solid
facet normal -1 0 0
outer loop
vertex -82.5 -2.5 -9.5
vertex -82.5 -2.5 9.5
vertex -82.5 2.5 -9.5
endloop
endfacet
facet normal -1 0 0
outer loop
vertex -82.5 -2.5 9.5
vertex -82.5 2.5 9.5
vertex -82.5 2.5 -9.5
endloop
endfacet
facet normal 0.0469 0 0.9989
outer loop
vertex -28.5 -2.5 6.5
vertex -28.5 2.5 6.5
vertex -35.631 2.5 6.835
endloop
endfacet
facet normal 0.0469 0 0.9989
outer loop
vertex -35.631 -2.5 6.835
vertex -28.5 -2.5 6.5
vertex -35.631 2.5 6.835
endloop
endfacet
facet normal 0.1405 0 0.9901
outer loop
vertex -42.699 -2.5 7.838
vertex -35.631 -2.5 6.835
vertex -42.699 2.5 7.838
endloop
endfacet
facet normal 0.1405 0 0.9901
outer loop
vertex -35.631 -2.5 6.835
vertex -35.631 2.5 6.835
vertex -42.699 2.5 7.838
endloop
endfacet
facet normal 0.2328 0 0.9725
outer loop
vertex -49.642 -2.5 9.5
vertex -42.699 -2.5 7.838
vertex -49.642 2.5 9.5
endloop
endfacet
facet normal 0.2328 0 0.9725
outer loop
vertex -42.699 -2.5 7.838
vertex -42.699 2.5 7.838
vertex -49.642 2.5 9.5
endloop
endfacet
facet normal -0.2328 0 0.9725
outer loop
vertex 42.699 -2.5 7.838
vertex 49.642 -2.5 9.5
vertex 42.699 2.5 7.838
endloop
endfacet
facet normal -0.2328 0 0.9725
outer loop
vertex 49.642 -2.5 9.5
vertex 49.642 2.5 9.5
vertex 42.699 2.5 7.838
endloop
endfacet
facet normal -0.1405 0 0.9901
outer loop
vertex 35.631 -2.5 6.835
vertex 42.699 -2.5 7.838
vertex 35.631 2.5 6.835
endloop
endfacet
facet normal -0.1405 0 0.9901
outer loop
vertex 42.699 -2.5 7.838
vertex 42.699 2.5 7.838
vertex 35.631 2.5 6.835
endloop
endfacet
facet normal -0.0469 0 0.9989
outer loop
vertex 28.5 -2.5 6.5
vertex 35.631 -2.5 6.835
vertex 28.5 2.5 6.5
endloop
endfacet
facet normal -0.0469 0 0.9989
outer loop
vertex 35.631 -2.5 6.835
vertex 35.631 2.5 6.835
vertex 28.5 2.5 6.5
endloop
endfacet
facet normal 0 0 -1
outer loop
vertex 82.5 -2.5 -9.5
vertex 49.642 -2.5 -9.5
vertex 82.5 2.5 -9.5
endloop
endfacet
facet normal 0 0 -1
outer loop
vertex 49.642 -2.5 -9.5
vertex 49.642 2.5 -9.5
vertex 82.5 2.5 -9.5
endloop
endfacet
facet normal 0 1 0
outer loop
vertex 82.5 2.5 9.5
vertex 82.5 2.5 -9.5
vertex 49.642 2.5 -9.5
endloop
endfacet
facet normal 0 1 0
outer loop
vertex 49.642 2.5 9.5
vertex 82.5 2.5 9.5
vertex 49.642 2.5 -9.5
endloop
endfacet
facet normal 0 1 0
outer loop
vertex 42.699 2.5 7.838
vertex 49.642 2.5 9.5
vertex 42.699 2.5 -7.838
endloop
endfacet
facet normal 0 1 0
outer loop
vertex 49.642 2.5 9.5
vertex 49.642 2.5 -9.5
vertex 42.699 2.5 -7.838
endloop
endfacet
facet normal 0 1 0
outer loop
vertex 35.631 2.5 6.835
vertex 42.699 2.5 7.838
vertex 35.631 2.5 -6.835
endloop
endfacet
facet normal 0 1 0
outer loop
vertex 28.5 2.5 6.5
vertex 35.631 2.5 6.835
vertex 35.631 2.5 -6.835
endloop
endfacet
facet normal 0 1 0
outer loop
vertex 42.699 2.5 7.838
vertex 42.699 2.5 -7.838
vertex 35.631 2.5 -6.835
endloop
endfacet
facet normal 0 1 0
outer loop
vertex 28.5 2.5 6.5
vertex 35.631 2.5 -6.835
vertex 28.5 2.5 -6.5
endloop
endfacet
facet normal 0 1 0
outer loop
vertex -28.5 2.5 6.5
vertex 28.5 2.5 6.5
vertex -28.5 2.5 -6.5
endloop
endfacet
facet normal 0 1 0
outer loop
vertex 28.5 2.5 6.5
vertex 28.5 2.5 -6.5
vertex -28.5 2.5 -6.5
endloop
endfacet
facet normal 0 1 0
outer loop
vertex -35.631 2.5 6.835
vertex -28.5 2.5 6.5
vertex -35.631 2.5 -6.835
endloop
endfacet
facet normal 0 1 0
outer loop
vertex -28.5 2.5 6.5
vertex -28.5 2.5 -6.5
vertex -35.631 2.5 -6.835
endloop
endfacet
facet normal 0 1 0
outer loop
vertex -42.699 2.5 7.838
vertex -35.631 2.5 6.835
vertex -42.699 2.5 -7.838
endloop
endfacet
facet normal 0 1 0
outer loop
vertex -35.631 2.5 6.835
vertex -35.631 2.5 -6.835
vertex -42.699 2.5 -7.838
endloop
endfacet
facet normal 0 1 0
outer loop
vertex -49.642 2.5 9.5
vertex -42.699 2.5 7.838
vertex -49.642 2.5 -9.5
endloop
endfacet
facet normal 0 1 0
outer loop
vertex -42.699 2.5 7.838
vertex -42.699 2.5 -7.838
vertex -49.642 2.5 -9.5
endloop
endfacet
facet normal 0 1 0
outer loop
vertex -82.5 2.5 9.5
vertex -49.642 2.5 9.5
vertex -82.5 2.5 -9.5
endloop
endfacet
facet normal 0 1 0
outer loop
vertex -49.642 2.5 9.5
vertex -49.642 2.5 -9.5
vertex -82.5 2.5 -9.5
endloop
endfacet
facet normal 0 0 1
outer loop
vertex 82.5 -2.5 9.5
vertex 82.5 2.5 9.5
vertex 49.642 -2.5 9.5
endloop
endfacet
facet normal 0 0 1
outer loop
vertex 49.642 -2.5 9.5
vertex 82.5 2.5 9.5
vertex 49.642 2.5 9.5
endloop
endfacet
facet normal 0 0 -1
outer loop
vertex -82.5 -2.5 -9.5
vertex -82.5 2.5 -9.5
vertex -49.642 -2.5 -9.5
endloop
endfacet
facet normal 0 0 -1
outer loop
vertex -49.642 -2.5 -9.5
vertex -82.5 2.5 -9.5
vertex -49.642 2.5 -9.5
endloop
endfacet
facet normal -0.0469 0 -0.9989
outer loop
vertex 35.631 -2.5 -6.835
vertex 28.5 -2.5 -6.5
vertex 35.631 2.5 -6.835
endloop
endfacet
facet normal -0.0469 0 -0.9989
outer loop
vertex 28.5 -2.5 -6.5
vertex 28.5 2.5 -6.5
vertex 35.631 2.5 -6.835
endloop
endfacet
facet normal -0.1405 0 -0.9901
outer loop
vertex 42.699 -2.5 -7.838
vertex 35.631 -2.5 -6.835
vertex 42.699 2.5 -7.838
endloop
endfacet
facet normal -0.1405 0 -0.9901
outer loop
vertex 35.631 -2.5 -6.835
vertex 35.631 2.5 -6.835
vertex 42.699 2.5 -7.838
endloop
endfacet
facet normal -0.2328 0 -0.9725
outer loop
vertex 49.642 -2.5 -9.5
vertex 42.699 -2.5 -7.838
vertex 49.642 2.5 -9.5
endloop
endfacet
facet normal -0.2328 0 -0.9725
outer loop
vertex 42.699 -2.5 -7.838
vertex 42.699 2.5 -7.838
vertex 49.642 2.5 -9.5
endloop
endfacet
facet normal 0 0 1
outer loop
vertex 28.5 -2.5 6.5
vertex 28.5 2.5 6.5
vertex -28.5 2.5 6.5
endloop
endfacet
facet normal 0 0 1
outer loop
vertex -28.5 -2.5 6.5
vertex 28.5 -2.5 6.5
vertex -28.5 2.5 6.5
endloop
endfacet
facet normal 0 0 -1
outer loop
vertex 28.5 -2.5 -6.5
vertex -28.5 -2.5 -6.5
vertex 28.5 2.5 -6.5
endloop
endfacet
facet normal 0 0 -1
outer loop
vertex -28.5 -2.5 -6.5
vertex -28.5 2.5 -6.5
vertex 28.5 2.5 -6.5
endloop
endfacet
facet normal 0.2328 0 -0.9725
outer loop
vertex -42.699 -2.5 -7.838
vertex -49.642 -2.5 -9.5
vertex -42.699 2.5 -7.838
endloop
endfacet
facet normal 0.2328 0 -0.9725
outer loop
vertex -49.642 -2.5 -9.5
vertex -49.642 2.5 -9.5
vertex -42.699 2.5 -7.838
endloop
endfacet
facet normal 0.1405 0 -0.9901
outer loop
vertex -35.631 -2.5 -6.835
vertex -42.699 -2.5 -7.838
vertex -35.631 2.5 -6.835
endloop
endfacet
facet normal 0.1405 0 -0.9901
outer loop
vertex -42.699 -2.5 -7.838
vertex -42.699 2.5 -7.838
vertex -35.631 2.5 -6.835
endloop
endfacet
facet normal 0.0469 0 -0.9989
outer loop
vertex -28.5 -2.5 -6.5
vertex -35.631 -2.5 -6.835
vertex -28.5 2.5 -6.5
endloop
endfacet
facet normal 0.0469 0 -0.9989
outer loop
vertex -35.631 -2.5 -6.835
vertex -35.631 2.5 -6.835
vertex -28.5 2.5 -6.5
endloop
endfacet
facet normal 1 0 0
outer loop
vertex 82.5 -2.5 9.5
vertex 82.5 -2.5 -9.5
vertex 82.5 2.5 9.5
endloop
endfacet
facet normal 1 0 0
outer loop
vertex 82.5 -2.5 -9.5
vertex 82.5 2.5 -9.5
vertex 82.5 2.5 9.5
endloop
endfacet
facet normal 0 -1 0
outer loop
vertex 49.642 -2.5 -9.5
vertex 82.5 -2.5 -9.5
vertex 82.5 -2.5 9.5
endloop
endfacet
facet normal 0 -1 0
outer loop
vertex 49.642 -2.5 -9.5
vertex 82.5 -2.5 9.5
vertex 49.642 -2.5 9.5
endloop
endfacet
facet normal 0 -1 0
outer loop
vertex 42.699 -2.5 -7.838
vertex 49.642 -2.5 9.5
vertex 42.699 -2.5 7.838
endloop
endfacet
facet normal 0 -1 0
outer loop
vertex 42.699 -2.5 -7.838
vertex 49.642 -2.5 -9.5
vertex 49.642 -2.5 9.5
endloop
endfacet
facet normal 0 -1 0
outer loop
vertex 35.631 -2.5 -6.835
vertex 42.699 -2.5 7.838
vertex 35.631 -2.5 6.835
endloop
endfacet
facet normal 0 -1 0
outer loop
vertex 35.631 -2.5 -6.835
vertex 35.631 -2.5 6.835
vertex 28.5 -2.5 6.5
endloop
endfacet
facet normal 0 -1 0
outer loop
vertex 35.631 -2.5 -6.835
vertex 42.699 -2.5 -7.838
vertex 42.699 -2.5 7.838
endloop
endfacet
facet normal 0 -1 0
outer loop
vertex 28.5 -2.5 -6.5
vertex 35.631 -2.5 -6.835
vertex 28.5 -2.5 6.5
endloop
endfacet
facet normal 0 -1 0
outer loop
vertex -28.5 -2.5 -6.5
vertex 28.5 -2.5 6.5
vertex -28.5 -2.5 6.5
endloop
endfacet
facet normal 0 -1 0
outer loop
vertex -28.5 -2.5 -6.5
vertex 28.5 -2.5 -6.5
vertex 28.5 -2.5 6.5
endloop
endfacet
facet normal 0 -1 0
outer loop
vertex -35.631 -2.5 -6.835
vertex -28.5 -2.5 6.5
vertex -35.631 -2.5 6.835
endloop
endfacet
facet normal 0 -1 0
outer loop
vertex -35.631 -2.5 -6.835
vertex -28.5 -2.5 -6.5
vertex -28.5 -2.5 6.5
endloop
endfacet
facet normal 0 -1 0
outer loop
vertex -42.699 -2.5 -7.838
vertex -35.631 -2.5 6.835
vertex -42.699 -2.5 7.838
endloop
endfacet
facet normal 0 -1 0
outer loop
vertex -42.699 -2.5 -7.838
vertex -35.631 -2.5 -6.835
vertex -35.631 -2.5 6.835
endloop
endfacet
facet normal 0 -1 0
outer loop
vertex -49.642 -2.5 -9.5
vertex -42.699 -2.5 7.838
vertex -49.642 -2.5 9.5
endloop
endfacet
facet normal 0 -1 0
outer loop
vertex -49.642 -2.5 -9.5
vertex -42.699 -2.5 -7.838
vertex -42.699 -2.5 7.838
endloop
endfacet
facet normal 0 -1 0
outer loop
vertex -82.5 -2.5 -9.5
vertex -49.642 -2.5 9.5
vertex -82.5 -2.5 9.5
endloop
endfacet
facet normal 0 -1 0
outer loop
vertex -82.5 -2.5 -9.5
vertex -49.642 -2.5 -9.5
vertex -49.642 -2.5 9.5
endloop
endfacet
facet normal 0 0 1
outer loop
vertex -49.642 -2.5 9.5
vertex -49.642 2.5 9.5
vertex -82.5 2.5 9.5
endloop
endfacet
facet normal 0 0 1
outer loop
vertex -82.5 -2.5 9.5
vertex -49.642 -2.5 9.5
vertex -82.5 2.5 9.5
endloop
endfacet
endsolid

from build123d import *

# Parameters (mm, degrees)
EXTRUDE_1_DEPTH = 2.5


with BuildPart() as part:
    # 스케치1 → 보스-돌출1 (new, symmetric)
    with BuildSketch(Plane(origin=(0, 0, 0), x_dir=(1, 0, 0), z_dir=(0, 1, 0))):
        with BuildLine():
            Line((-49.642374512, -9.5), (-82.5, -9.5))
            Line((-82.5, -9.5), (-82.5, 9.5))
            Line((-82.5, 9.5), (-49.642374512, 9.5))
            ThreePointArc((-49.642374512, 9.5), (-39.177078252, 7.253737634), (-28.5, 6.5))
            Line((-28.5, 6.5), (28.5, 6.5))
            ThreePointArc((28.5, 6.5), (39.177078252, 7.253737634), (49.642374512, 9.5))
            Line((49.642374512, 9.5), (82.5, 9.5))
            Line((82.5, 9.5), (82.5, -9.5))
            Line((82.5, -9.5), (49.642374512, -9.5))
            ThreePointArc((49.642374512, -9.5), (39.177078252, -7.253737634), (28.5, -6.5))
            Line((28.5, -6.5), (-28.5, -6.5))
            ThreePointArc((-28.5, -6.5), (-39.177078252, -7.253737634), (-49.642374512, -9.5))
        make_face()
    extrude(amount=EXTRUDE_1_DEPTH, both=True)


solid = part.part
